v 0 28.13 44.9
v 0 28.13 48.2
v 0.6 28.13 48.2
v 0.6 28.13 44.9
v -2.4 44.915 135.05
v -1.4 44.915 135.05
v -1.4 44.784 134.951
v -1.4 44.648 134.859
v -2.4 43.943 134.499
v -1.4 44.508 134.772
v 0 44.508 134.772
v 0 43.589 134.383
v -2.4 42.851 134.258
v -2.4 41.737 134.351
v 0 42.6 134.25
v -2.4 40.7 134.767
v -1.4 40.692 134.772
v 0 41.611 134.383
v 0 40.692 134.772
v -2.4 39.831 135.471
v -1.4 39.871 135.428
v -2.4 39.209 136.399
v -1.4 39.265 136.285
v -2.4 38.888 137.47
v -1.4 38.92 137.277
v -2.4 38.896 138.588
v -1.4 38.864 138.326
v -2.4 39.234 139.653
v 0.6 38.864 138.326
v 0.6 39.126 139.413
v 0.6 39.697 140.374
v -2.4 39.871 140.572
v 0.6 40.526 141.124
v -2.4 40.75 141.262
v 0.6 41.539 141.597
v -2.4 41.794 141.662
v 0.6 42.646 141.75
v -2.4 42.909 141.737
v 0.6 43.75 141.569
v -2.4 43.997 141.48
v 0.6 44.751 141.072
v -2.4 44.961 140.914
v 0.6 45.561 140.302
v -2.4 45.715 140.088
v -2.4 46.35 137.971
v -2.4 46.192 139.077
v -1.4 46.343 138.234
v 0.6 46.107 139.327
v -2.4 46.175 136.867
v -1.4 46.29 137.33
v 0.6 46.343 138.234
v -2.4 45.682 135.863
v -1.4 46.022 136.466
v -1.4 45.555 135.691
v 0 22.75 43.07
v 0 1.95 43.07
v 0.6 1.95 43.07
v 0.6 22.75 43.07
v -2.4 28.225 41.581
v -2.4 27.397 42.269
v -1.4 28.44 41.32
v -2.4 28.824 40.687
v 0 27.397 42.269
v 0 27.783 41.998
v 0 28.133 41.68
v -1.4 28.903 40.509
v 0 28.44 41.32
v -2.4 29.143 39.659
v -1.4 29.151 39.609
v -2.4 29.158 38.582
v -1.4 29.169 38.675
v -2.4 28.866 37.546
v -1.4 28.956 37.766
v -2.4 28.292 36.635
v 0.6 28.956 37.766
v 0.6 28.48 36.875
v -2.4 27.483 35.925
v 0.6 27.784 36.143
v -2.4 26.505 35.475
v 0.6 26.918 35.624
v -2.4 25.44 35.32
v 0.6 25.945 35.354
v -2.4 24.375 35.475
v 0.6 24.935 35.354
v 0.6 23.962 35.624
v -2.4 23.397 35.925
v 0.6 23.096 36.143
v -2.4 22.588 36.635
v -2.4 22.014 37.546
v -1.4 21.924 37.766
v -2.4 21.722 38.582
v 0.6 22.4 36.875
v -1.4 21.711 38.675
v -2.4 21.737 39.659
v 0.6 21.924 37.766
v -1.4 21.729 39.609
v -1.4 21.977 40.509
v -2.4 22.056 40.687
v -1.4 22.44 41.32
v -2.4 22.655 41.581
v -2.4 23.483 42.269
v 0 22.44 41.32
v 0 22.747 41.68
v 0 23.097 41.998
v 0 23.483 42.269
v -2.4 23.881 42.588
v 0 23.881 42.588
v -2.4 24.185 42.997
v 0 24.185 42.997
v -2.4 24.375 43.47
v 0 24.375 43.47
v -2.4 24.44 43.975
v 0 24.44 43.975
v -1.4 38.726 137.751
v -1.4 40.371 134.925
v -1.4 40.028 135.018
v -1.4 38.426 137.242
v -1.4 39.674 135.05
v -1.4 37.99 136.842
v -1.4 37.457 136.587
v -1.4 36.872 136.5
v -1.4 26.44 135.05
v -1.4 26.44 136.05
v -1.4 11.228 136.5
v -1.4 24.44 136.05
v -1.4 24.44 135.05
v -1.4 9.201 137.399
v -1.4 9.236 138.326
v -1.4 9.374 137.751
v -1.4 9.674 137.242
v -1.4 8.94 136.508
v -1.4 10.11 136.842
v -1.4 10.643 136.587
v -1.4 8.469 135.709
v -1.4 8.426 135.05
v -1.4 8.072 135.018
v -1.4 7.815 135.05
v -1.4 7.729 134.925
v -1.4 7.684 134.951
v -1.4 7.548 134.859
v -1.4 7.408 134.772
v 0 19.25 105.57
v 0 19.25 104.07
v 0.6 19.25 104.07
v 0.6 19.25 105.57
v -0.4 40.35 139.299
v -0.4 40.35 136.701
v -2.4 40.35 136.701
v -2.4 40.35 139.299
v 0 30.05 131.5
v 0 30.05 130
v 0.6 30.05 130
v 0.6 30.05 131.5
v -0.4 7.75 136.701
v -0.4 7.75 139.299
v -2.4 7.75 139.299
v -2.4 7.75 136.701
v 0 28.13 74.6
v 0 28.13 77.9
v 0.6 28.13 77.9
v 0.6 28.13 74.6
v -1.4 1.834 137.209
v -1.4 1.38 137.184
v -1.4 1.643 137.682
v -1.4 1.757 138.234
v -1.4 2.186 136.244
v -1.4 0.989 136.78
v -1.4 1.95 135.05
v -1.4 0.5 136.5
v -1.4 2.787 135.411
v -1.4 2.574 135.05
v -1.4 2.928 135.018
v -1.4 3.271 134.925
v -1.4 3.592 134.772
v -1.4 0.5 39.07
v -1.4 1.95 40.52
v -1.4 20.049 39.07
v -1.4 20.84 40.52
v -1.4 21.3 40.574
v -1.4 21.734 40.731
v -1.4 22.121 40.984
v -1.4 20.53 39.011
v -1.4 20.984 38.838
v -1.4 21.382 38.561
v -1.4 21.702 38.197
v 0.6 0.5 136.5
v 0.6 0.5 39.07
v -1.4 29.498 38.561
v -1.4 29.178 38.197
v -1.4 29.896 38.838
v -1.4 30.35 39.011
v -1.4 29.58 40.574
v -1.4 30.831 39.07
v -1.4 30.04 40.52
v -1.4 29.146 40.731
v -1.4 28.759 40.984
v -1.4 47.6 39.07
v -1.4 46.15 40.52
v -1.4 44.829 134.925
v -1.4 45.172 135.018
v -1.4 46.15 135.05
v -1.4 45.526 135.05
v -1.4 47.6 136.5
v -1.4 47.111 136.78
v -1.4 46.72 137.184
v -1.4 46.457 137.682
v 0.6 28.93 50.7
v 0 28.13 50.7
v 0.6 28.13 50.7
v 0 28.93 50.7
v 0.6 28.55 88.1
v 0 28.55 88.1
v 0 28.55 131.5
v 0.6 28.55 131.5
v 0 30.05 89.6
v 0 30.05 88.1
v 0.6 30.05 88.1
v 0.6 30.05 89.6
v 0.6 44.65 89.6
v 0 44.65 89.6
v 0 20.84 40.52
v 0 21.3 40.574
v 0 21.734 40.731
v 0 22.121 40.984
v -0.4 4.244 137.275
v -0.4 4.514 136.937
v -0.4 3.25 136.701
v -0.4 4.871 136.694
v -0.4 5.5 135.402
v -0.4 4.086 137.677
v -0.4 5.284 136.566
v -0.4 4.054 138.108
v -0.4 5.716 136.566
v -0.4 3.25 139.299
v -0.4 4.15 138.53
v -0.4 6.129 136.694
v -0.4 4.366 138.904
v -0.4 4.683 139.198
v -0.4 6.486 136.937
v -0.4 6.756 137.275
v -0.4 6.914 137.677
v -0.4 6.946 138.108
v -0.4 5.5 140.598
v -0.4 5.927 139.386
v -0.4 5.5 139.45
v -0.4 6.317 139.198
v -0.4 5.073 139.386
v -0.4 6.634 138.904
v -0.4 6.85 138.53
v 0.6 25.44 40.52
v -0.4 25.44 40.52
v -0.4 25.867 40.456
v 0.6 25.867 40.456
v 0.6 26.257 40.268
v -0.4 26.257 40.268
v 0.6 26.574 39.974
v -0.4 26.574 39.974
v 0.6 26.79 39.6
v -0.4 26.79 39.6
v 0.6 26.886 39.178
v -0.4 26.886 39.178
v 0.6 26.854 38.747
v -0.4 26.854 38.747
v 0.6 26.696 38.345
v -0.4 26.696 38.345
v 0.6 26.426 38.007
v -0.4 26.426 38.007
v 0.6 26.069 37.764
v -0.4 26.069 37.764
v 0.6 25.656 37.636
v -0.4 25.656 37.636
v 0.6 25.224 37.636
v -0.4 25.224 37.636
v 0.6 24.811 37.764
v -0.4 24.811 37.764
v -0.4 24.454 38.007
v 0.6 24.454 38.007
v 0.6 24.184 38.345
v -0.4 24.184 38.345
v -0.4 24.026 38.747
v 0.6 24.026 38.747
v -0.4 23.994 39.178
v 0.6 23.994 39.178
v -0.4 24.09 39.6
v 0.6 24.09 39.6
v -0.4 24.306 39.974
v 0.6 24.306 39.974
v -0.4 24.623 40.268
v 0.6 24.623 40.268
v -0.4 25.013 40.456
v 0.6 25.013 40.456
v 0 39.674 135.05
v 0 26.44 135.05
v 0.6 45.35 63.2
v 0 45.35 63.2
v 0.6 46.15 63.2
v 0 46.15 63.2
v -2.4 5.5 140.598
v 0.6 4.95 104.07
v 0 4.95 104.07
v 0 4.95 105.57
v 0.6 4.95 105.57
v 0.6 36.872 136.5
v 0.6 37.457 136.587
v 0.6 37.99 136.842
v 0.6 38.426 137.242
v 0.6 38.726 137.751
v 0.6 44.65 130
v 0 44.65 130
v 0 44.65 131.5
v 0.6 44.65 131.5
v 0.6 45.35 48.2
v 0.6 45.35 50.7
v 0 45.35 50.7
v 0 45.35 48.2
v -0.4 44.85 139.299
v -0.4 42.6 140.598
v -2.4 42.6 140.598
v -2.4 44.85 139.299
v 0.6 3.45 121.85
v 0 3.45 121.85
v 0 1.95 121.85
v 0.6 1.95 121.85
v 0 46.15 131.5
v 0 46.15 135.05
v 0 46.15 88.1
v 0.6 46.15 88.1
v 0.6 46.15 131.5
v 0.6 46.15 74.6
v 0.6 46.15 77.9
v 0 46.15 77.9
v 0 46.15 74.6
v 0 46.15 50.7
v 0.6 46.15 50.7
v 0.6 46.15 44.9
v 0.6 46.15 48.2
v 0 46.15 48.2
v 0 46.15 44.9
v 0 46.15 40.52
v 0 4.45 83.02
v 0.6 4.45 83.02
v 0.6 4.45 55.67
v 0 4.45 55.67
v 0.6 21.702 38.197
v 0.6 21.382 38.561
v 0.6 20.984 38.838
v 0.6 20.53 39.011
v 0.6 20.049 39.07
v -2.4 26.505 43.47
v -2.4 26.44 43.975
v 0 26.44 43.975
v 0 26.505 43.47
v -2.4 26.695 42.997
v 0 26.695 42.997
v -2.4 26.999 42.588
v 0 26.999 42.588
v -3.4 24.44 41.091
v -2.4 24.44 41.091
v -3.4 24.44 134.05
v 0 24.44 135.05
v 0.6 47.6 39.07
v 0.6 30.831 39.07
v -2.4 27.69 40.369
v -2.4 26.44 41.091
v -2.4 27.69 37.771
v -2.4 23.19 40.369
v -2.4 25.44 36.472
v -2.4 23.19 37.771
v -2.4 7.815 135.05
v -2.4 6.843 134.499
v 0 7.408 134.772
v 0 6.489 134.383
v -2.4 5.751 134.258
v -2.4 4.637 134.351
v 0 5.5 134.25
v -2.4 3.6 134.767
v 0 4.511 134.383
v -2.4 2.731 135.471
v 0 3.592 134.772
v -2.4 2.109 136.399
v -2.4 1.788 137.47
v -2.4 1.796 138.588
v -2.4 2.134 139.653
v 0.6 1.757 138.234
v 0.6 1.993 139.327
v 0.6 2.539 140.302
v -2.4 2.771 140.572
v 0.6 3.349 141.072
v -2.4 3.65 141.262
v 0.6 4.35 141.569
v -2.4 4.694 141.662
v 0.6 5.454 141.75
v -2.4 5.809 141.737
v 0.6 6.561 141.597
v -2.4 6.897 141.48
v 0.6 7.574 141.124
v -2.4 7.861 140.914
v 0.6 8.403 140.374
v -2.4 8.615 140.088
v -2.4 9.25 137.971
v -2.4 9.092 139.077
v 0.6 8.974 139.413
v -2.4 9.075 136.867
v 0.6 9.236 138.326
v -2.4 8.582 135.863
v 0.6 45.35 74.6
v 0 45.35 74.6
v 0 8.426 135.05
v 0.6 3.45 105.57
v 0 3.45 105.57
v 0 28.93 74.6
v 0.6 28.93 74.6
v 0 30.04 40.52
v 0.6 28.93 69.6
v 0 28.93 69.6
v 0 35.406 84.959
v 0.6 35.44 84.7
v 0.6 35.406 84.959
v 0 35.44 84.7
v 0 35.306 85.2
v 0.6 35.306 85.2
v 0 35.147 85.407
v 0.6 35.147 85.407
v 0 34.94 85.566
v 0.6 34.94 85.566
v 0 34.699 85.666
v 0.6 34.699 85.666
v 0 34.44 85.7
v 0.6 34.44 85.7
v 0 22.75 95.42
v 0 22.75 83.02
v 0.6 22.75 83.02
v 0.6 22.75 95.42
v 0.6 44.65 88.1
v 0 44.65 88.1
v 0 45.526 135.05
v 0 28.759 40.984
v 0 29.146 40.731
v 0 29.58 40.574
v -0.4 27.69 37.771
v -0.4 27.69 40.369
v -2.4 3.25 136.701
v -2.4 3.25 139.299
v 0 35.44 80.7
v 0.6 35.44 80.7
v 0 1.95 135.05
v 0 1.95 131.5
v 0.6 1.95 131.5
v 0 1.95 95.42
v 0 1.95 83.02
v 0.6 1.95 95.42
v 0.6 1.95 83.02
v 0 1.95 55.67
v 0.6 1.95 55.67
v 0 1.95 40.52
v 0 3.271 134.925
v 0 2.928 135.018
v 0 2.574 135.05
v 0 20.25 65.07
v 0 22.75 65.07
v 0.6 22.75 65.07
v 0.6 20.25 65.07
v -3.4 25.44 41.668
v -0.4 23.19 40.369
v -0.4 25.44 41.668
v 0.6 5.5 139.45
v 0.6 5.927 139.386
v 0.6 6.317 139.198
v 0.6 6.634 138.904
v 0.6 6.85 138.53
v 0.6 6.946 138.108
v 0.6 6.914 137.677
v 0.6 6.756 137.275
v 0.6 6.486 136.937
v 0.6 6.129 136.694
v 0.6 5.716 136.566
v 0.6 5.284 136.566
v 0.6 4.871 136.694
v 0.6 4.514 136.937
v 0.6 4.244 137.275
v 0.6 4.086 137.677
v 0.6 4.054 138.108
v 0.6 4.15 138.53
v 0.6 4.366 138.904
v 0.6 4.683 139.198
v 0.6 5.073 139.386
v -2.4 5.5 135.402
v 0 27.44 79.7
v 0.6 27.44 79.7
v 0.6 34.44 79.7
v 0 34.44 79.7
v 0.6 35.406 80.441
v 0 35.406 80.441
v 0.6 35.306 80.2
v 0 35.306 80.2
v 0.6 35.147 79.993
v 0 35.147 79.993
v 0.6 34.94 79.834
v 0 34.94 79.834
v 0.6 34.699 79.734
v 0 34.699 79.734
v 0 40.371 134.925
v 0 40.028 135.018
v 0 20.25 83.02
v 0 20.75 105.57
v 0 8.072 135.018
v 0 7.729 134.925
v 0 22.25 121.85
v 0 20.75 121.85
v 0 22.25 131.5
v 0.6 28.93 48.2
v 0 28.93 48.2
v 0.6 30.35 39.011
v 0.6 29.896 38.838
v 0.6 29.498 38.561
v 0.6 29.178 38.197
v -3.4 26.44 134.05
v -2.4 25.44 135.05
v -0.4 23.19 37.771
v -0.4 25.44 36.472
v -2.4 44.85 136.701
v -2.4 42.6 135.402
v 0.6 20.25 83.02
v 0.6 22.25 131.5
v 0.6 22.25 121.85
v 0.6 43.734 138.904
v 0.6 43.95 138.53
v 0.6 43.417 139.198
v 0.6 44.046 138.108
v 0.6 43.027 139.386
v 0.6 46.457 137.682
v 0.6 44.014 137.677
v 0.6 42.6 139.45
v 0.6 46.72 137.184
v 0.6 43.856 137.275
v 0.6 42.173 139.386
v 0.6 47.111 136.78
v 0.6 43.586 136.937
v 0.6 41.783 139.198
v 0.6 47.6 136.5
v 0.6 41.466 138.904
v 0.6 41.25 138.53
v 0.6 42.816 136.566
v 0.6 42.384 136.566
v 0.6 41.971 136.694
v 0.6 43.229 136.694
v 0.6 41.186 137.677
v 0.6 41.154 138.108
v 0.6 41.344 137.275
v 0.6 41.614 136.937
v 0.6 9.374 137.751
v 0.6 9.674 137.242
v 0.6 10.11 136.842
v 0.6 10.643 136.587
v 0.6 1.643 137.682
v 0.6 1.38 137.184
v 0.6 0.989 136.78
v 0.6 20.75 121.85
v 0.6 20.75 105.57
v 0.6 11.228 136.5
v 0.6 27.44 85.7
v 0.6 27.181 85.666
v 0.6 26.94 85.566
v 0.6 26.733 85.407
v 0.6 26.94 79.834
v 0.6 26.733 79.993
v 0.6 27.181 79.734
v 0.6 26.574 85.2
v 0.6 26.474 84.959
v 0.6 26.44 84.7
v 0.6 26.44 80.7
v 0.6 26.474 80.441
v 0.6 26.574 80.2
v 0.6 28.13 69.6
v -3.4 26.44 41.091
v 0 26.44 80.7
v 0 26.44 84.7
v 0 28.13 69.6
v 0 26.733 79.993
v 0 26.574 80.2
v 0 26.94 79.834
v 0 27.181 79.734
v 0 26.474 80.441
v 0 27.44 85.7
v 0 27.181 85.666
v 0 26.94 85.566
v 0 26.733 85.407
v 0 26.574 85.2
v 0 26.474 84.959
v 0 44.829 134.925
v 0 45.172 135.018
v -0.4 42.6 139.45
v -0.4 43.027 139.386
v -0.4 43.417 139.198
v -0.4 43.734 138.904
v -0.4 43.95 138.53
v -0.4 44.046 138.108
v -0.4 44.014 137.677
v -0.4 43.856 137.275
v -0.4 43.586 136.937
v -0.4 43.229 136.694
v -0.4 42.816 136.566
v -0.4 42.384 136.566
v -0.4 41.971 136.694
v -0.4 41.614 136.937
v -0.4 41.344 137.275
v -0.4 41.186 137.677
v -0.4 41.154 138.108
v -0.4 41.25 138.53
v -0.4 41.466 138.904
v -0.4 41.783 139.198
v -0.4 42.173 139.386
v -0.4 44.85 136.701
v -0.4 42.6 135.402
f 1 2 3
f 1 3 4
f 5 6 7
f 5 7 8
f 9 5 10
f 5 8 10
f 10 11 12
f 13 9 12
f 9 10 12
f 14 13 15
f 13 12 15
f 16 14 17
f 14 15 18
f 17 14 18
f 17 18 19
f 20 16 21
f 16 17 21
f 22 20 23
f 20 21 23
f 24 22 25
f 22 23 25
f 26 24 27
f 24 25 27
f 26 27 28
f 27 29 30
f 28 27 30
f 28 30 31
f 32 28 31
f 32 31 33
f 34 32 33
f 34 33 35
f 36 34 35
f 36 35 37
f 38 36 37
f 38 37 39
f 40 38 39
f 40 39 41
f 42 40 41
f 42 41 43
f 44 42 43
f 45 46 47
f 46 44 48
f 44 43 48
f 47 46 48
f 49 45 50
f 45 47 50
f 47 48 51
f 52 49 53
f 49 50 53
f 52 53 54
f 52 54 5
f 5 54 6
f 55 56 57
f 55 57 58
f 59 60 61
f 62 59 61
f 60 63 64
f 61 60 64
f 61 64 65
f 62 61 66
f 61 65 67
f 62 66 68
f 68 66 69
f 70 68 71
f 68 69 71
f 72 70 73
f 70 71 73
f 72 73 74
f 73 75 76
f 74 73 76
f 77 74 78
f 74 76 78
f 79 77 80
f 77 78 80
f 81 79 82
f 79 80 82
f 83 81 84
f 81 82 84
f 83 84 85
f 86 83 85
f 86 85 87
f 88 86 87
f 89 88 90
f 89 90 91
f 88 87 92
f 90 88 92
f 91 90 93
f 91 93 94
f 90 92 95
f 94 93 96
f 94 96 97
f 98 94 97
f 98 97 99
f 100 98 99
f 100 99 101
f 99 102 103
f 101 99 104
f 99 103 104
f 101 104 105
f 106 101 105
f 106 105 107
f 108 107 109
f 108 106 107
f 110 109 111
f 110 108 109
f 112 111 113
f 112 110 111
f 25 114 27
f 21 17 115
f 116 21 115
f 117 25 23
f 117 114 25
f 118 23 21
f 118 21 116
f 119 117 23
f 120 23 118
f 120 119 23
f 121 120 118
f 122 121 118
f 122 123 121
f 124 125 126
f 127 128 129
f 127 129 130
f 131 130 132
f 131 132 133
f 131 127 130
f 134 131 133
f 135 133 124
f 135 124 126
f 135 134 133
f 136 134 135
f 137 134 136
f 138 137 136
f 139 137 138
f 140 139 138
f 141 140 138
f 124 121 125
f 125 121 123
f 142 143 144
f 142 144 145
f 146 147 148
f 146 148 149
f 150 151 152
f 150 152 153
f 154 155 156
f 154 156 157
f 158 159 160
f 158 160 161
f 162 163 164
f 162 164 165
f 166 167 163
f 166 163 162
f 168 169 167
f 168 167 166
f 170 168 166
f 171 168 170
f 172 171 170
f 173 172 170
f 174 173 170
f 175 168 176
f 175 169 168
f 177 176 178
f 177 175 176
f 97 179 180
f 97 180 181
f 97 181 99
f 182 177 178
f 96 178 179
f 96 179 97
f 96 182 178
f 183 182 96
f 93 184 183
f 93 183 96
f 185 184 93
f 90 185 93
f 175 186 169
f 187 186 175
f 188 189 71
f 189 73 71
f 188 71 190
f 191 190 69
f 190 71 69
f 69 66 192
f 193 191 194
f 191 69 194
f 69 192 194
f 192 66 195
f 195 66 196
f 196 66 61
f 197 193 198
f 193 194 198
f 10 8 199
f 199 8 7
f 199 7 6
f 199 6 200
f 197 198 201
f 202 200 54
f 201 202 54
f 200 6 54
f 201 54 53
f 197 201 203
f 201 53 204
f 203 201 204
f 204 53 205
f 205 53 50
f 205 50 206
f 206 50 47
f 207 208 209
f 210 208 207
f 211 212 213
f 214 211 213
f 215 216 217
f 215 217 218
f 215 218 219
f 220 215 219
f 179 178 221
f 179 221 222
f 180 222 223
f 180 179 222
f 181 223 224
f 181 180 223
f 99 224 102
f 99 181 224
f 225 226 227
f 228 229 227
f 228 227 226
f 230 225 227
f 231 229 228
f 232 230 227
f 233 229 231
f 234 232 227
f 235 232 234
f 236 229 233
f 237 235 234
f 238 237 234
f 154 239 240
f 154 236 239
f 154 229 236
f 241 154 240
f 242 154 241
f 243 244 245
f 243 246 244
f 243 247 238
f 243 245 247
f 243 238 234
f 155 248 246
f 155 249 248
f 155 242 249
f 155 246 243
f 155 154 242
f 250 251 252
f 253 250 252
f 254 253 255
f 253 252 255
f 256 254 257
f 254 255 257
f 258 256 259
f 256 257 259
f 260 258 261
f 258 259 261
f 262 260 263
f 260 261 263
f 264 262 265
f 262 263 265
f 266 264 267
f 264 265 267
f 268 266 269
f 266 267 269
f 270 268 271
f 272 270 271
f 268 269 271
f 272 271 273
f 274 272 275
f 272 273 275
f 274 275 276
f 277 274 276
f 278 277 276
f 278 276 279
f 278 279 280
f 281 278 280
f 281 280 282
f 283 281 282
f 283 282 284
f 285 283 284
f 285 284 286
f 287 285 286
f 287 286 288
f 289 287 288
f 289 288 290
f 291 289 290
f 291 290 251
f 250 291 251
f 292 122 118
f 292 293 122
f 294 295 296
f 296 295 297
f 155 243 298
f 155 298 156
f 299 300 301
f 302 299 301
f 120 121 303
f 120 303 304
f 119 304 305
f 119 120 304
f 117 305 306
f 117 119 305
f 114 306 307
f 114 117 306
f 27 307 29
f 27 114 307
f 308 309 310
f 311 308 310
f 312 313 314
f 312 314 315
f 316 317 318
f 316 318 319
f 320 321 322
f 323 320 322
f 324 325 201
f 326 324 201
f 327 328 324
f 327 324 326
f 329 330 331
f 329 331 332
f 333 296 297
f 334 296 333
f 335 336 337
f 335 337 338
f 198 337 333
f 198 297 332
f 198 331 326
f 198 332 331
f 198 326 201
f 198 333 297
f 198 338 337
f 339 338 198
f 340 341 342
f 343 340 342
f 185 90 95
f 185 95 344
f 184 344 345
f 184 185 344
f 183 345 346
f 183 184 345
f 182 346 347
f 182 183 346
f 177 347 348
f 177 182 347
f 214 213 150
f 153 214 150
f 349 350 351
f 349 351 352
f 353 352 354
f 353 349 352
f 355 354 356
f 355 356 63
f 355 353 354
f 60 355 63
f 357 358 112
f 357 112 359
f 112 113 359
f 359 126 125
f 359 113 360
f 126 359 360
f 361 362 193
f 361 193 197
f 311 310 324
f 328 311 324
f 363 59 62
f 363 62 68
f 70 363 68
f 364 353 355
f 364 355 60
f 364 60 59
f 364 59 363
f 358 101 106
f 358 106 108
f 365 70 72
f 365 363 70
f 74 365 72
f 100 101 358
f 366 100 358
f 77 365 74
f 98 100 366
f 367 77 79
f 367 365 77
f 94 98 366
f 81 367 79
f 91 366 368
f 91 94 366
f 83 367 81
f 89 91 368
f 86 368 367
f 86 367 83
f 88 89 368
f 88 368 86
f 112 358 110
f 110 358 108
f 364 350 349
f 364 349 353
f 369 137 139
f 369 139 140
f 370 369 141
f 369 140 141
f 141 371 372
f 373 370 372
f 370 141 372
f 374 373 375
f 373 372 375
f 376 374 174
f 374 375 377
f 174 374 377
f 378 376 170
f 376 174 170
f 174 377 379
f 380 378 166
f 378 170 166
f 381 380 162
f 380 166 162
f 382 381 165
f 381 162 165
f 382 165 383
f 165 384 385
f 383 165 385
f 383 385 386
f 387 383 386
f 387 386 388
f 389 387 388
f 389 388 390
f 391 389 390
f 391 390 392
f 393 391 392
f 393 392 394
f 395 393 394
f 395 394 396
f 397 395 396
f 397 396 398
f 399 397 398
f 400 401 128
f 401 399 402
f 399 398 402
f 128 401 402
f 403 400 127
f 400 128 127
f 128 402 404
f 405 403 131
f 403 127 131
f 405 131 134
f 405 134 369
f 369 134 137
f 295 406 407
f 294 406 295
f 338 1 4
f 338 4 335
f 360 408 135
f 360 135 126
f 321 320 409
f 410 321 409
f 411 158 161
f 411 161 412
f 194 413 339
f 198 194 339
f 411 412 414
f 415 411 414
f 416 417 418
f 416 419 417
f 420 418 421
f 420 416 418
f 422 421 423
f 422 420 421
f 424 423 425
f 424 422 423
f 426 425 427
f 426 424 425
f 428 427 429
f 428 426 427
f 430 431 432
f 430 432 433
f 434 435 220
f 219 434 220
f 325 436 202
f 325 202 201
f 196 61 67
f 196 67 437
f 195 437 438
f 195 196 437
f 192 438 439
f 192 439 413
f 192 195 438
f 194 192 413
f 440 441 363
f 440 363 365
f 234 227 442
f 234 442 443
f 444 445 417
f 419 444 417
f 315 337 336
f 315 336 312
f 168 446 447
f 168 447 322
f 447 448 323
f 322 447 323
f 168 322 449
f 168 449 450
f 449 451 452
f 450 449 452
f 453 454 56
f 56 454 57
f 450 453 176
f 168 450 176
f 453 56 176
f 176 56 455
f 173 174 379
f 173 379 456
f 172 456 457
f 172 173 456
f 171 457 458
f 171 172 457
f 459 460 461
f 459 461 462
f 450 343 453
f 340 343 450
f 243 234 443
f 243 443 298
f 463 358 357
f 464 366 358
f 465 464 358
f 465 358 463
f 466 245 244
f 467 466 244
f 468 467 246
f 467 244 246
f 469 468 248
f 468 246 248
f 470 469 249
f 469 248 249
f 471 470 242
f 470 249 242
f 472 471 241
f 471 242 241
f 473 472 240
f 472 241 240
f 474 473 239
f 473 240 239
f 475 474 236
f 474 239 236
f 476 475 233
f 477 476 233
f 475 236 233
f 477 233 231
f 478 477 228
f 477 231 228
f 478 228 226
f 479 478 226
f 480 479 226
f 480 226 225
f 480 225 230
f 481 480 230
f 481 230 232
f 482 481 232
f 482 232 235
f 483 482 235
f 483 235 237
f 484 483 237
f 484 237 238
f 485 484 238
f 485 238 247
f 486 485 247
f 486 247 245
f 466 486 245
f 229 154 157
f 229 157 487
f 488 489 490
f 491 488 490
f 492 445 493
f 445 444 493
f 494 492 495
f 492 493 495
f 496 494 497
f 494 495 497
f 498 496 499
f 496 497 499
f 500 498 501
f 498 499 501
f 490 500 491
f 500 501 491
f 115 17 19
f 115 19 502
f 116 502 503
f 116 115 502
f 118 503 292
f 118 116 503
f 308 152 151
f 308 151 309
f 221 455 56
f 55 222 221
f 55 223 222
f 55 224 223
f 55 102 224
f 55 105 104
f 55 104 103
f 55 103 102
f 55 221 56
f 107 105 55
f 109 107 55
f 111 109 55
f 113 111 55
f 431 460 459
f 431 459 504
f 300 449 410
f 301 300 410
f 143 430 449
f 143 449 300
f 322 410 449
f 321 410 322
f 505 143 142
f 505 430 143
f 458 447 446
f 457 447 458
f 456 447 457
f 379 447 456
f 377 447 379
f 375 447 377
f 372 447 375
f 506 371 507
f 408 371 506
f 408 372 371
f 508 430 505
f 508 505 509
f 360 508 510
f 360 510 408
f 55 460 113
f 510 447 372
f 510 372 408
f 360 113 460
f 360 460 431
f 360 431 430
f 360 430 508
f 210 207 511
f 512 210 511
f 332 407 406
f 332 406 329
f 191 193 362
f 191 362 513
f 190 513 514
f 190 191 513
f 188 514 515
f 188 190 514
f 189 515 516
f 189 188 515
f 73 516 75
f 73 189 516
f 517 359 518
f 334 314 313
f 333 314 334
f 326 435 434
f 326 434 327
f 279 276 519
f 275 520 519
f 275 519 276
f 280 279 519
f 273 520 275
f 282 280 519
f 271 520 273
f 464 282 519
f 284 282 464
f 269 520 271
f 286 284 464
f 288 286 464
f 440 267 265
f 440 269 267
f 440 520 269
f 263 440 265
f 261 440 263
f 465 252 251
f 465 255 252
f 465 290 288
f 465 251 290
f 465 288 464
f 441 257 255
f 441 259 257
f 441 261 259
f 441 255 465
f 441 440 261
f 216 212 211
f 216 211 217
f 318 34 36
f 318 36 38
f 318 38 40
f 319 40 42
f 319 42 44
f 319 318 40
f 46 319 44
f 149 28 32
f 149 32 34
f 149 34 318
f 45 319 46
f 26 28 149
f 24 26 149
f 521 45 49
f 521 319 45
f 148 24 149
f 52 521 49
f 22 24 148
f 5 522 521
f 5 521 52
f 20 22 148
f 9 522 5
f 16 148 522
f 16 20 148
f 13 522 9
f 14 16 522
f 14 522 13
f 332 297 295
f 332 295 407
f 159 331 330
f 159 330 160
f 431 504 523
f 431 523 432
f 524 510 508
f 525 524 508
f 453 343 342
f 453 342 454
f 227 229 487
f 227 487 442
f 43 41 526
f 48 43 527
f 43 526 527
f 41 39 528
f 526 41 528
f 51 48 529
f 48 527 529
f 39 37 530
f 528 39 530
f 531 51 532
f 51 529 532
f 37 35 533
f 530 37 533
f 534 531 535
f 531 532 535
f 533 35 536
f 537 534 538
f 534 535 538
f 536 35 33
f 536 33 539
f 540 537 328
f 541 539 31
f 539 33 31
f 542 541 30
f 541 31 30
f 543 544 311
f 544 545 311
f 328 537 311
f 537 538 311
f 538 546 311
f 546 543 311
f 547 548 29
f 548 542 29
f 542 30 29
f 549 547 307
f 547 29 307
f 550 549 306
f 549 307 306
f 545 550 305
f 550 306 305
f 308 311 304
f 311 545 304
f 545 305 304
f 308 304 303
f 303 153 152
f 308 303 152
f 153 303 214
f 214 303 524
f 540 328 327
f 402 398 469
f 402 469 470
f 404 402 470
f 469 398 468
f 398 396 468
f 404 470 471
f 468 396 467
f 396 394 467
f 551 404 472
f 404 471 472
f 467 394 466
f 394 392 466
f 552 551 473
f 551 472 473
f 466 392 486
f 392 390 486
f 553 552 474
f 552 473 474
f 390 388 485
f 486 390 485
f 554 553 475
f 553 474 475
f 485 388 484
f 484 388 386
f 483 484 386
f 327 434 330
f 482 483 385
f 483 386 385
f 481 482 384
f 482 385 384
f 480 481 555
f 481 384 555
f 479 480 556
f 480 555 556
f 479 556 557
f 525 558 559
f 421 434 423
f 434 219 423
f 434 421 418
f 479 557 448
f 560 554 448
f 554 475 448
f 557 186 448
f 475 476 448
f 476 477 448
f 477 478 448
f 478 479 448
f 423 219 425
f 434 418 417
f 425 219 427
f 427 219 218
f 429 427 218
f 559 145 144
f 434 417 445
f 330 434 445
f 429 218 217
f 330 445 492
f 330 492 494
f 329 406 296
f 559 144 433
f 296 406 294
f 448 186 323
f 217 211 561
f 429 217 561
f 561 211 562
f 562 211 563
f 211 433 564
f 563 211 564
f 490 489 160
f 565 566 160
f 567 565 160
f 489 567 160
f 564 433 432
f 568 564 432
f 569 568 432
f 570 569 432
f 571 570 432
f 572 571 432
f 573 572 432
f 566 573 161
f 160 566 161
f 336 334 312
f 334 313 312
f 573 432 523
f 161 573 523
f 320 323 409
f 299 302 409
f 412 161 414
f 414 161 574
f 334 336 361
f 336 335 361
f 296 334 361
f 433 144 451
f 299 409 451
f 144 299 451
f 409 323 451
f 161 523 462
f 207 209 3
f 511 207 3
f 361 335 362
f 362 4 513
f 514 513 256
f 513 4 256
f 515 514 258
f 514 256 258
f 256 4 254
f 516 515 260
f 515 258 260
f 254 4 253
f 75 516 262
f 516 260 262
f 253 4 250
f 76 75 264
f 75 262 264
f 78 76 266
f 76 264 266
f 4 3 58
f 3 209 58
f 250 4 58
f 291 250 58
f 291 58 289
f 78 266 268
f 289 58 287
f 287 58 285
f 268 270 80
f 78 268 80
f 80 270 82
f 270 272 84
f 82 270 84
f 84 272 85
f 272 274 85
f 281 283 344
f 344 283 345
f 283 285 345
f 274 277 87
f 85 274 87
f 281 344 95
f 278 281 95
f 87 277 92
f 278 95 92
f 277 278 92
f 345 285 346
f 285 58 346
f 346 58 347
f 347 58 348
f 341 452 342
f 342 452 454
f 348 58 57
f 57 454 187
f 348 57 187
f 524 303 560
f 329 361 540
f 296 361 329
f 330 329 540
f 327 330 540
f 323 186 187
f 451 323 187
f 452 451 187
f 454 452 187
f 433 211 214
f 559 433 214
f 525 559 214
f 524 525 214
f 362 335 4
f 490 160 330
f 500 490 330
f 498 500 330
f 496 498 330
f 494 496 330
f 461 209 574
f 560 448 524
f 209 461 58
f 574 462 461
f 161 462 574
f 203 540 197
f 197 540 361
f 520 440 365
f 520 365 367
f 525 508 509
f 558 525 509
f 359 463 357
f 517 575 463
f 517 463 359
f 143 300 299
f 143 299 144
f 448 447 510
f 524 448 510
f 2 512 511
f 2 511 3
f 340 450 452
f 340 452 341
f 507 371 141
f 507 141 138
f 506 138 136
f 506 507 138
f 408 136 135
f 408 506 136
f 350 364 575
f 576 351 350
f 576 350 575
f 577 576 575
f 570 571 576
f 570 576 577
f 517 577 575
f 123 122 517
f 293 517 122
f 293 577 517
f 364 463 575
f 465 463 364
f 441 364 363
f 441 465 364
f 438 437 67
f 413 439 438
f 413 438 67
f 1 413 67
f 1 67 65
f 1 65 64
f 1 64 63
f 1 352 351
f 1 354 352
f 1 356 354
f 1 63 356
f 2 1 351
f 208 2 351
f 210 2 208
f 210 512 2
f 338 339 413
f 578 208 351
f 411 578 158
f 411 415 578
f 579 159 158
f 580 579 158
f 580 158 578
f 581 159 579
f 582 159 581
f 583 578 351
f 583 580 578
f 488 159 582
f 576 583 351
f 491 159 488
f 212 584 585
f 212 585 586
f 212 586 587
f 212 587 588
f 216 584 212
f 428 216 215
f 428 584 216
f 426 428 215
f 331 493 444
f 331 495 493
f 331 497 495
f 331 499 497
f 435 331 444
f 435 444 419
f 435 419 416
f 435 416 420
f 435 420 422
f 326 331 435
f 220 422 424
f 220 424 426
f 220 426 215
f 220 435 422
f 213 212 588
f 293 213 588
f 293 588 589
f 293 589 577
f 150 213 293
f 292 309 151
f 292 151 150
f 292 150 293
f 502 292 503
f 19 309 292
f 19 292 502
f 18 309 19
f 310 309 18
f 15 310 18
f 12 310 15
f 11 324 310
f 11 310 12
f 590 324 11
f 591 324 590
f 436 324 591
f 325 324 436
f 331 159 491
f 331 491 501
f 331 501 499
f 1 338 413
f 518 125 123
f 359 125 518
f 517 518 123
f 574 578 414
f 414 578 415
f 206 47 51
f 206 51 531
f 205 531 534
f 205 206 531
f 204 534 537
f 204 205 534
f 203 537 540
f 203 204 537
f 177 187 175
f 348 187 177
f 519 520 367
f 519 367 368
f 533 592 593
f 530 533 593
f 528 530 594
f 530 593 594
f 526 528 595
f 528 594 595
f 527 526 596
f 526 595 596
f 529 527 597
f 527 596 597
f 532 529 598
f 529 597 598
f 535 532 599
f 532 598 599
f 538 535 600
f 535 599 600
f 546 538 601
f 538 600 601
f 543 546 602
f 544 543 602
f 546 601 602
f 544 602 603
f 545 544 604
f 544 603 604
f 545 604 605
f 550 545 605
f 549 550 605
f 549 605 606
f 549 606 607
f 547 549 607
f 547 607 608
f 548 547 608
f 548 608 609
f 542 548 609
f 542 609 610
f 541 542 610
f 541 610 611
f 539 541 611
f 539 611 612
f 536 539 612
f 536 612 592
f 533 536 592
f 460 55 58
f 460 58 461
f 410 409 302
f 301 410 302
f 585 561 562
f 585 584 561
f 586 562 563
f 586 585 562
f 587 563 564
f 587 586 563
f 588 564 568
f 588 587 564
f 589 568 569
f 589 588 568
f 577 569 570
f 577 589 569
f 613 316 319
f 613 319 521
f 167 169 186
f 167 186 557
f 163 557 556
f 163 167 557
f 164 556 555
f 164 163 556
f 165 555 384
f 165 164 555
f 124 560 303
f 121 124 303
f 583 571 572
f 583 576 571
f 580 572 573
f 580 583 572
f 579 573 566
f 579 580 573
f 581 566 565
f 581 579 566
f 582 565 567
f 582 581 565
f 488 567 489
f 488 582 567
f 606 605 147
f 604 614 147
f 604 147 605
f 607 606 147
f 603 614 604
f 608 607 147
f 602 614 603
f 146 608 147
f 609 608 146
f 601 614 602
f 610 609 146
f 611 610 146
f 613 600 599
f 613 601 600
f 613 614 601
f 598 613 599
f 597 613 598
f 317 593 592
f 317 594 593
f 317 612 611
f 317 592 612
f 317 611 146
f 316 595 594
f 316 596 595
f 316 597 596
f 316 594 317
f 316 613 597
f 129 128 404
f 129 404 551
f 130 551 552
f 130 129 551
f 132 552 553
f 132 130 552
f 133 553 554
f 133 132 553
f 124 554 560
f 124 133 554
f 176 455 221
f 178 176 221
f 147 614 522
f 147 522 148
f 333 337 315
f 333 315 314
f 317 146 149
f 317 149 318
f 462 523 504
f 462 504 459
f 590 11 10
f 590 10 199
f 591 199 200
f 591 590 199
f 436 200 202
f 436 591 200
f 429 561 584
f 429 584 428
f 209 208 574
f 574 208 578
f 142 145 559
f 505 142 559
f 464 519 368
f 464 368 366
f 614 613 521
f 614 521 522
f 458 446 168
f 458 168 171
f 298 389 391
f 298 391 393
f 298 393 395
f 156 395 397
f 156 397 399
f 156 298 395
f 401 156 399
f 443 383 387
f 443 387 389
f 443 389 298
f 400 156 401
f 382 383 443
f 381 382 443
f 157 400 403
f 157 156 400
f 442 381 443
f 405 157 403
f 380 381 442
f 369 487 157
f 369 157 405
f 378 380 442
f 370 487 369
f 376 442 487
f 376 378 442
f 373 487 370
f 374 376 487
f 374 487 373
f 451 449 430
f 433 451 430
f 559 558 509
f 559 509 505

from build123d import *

# Parameters (mm, degrees)
BOSS_EXTRUDE1_DEPTH             = 0.6
SKETCH3_W                       = 40.4
SKETCH3_H                       = 14.6
SKETCH3_W_2                     = 31.4
SKETCH3_H_2                     = 16.42
SKETCH3_W_3                     = 40.3
SKETCH3_H_3                     = 15.8
SKETCH3_W_4                     = 24.43
SKETCH3_H_4                     = 17.3
CUT_EXTRUDE1_DEPTH              = 145.562685365
SKETCH4_W                       = 12.4
SKETCH4_H                       = 20.8
SKETCH4_W_2                     = 12.5
SKETCH4_H_2                     = 0.8
SKETCH4_W_3                     = 18.9
SKETCH4_W_4                     = 43.4
SKETCH4_H_3                     = 1.5
SKETCH4_W_5                     = 1.5
SKETCH4_H_4                     = 14.3
CUT_EXTRUDE2_DEPTH              = 145.562685365
SKETCH5_W                       = 97.43
SKETCH5_H                       = 47.1
SKETCH5_W_2                     = 94.53
SKETCH5_H_2                     = 44.2
BOSS_EXTRUDE2_DEPTH             = 2
BOSS_EXTRUDE3_REACH             = 146.575
SKETCH6_W                       = 94.53
SKETCH6_H                       = 2
BOSS_EXTRUDE3_DIRECTION_2_DEPTH = 2
SKETCH7_R                       = 3.75
BOSS_EXTRUDE4_DEPTH             = 3
CUT_EXTRUDE3_DEPTH              = 150.558759356
CUT_EXTRUDE3_DEPTH_BACK         = 2
SKETCH9_R                       = 1.45
CUT_EXTRUDE4_DEPTH              = 150.558759356
CHAMFER1_SIZE                   = 1
FILLET1_R                       = 2
CUT_EXTRUDE5_DEPTH              = 150.542042583
CUT_EXTRUDE5_DEPTH_BACK         = 150.542042583
SKETCH10_W                      = 6
SKETCH10_H                      = 9
FILLET2_R                       = 1


# Some blends are built 0.0001 mm under size
with BuildPart() as part:
    # Sketch1 → Boss-Extrude1 (new body)
    with BuildSketch(Plane(origin=(0, 0, 0), x_dir=(0, 0, -1), z_dir=(1, 0, 0))):
        Polygon((-39.07, 0.5), (-136.5, 0.5), (-136.5, 47.6), (-39.07, 47.6), (-39.07, 28.13), align=None)
    extrude(amount=BOSS_EXTRUDE1_DEPTH)

    # Sketch3 → Cut-Extrude1 (cut, through all)
    with BuildSketch(Plane(origin=(0.6, 0, 0), x_dir=(0, 0, -1), z_dir=(1, 0, 0))):
        with Locations((-109.8, 37.35)):
            Rectangle(SKETCH3_W, SKETCH3_H)
        with Locations((-61.4, 37.14)):
            Rectangle(SKETCH3_W_2, SKETCH3_H_2)
        with Locations((-67.72, 12.35)):
            Rectangle(SKETCH3_W_3, SKETCH3_H_3)
        with Locations((-117.785, 12.1)):
            Rectangle(SKETCH3_W_4, SKETCH3_H_4)
    extrude(amount=-CUT_EXTRUDE1_DEPTH, mode=Mode.SUBTRACT)

    # Sketch4 → Cut-Extrude2 (cut, through all)
    with BuildSketch(Plane.ZY):
        with Locations((89.22, 12.35)):
            Rectangle(SKETCH4_W, SKETCH4_H)
        Polygon((65.07, 22.75), (65.07, 20.25), (55.67, 20.25), (55.67, 1.95), (43.07, 1.95), (43.07, 22.75), align=None)
        Polygon((44.9, 28.13), (44.9, 46.15), (48.2, 46.15), (48.2, 45.35), (45.7, 45.35), (45.7, 28.93), (48.2, 28.93), (48.2, 28.13), align=None)
        Polygon((77.9, 28.13), (74.6, 28.13), (74.6, 28.93), (77.1, 28.93), (77.1, 45.35), (74.6, 45.35), (74.6, 46.15), (77.9, 46.15), align=None)
        with Locations((56.95, 45.75)):
            Rectangle(SKETCH4_W_2, SKETCH4_H_2)
        with Locations((60.15, 28.53)):
            Rectangle(SKETCH4_W_3, SKETCH4_H_2)
        with Locations((109.8, 45.4)):
            Rectangle(SKETCH4_W_4, SKETCH4_H_3)
        with Locations((109.8, 29.3)):
            Rectangle(SKETCH4_W_4, SKETCH4_H_3)
        Polygon((131.5, 1.95), (131.5, 22.25), (121.85, 22.25), (121.85, 20.75), (130, 20.75), (130, 3.45), (121.85, 3.45), (121.85, 1.95), align=None)
        with Locations((104.82, 12.1)):
            Rectangle(SKETCH4_W_5, SKETCH4_H_4)
    extrude(amount=-CUT_EXTRUDE2_DEPTH, mode=Mode.SUBTRACT)

    # Sketch5 → Boss-Extrude2 (add)
    with BuildSketch(Plane(origin=(0.6, 0, 0), x_dir=(0, 0, -1), z_dir=(1, 0, 0))):
        with Locations((-87.785, 24.05)):
            Rectangle(SKETCH5_W, SKETCH5_H)
        with Locations((-87.785, 24.05)):
            Rectangle(SKETCH5_W_2, SKETCH5_H_2, mode=Mode.SUBTRACT)
    extrude(amount=-BOSS_EXTRUDE2_DEPTH)

    # Sketch6 → Boss-Extrude3 (add, up to next)
    with BuildSketch(Plane.ZY.offset(1.4), mode=Mode.PRIVATE) as boss_extrude3_sk1:
        with Locations((87.785, 25.44)):
            Rectangle(SKETCH6_W, SKETCH6_H)
    boss_extrude3_tool1 = extrude(boss_extrude3_sk1.sketch, amount=-BOSS_EXTRUDE3_REACH, mode=Mode.PRIVATE) - part.part
    add(boss_extrude3_tool1.solids().sort_by_distance((-1.4, 25.44, 87.785))[0])

    # Sketch6 → Boss-Extrude3 direction 2 (add)
    with BuildSketch(Plane.ZY.offset(1.4)):
        with Locations((87.785, 25.44)):
            Rectangle(SKETCH6_W, SKETCH6_H)
    extrude(amount=BOSS_EXTRUDE3_DIRECTION_2_DEPTH)

    # Sketch7 → Boss-Extrude4 (add)
    with BuildSketch(Plane.ZY.offset(-0.6)):
        with Locations((39.07, 25.44)):
            Circle(SKETCH7_R)
        with Locations(Location((138, 42.6, 0), (0, 0, 141.875088378))):
            Circle(SKETCH7_R)
        with Locations(Location((138, 5.5, 0), (0, 0, 141.875088378))):
            Circle(SKETCH7_R)
    extrude(amount=BOSS_EXTRUDE4_DEPTH)

    # Sketch8 → Cut-Extrude3 (cut, two sides: drawn at the far end of the back side and taken through both)
    with BuildSketch(Plane.ZY.offset(2.4).offset(-CUT_EXTRUDE3_DEPTH_BACK)):
        Polygon((36.471923789, 25.44), (37.770961894, 23.19), (40.369038106, 23.19), (41.668076211, 25.44), (40.369038106, 27.69), (37.770961894, 27.69), align=None)
        Polygon((139.299038106, 44.85), (136.700961894, 44.85), (135.401923789, 42.6), (136.700961894, 40.35), (139.299038106, 40.35), (140.598076211, 42.6), align=None)
        Polygon((139.299038106, 7.75), (136.700961894, 7.75), (135.401923789, 5.5), (136.700961894, 3.25), (139.299038106, 3.25), (140.598076211, 5.5), align=None)
    extrude(amount=CUT_EXTRUDE3_DEPTH + CUT_EXTRUDE3_DEPTH_BACK, mode=Mode.SUBTRACT)

    # Sketch9 → Cut-Extrude4 (cut, through all)
    with BuildSketch(Plane.ZY.offset(0.4)):
        with Locations((138, 5.5)):
            Circle(SKETCH9_R)
        with Locations((138, 42.6)):
            Circle(SKETCH9_R)
        with Locations((39.07, 25.44)):
            Circle(SKETCH9_R)
    extrude(amount=-CUT_EXTRUDE4_DEPTH, mode=Mode.SUBTRACT)

    # Chamfer1
    chamfer1_edges = [part.edges().sort_by_distance(p)[0] for p in [
        (-1.4, 25.44, 135.05),
    ]]
    chamfer(chamfer1_edges, length=CHAMFER1_SIZE)
    chamfer1_2_edges = [part.edges().sort_by_distance(p)[0] for p in [
        (-2.9, 24.44, 135.05),
        (-2.9, 26.44, 135.05),
        (-3.4, 25.44, 135.05),
    ]]
    chamfer(chamfer1_2_edges, length=CHAMFER1_SIZE - 0.0001)  # a hair under: the kernel refuses the full size

    # Fillet1
    # the kernel refuses this fillet: 2 mm, written as the material it adds along each edge
    with BuildSketch(Plane(origin=(-2.4, 26.44, 42.684208074), x_dir=(0, 0, 1), z_dir=(1, 0, 0))) as fillet1_piece_1:
        with BuildLine():
            CenterArc((1.291146144, -2), FILLET1_R, 90, 58.551018611)
            Line((-0.415064019, -0.956521739), (-0.449188222, -0.935652174))
            ThreePointArc((-0.449188222, -0.935652174), (-0.210818686, -0.47683468), (-0.038551553, 0.010666667))
            Line((-0.038551553, 0.010666667), (0, 0.04))
            Line((0, 0.04), (1.291146144, 0.04))
            Line((1.291146144, 0.04), (1.291146144, 0))
        make_face()
    extrude(amount=2.4)
    with BuildSketch(Plane(origin=(-1.4, 21.69, 39.07), x_dir=(0, -1, 0), z_dir=(1, 0, 0))) as fillet1_piece_2:
        with BuildLine():
            CenterArc((1.640964663, 2), FILLET1_R, 200.354406398, 69.645593602)
            Line((-0.234153481, 1.304347826), (-0.271655843, 1.290434783))
            ThreePointArc((-0.271655843, 1.290434783), (-0.098373183, 0.655531532), (-0.04, 0))
            Line((-0.04, 0), (0, -0.04))
            Line((0, -0.04), (1.640964663, -0.04))
            Line((1.640964663, -0.04), (1.640964663, 0))
        make_face()
    extrude(amount=2)
    with BuildSketch(Plane(origin=(-1.4, 21.981676707, 40.52), x_dir=(0, -1, 0), z_dir=(1, 0, 0))) as fillet1_piece_3:
        with BuildLine():
            CenterArc((1.141676707, -2), FILLET1_R, 90, 53.130102354)
            Line((-0.458323293, -0.8), (-0.490323293, -0.776))
            ThreePointArc((-0.490323293, -0.776), (-0.23918937, -0.394255076), (-0.036888782, 0.015466667))
            Line((-0.036888782, 0.015466667), (0, 0.04))
            Line((0, 0.04), (1.141676707, 0.04))
            Line((1.141676707, 0.04), (1.141676707, 0))
        make_face()
    extrude(amount=1.4)
    with BuildSketch(Plane(origin=(-2.4, 24.44, 42.684208074), x_dir=(0, 0, 1), z_dir=(1, 0, 0))) as fillet1_piece_4:
        with BuildLine():
            CenterArc((1.291146144, 2), FILLET1_R, 211.448981389, 58.551018611)
            Line((-0.415064019, 0.956521739), (-0.449188222, 0.935652174))
            ThreePointArc((-0.449188222, 0.935652174), (-0.210818686, 0.47683468), (-0.038551553, -0.010666667))
            Line((-0.038551553, -0.010666667), (0, -0.04))
            Line((0, -0.04), (1.291146144, -0.04))
            Line((1.291146144, -0.04), (1.291146144, 0))
        make_face()
    extrude(amount=2.4)
    with BuildSketch(Plane(origin=(-1.4, 28.898323293, 40.52), x_dir=(0, 1, 0), z_dir=(1, 0, 0))) as fillet1_piece_5:
        with BuildLine():
            CenterArc((1.141676707, 2), FILLET1_R, 216.869897646, 53.130102354)
            Line((-0.458323293, 0.8), (-0.490323293, 0.776))
            ThreePointArc((-0.490323293, 0.776), (-0.23918937, 0.394255076), (-0.036888782, -0.015466667))
            Line((-0.036888782, -0.015466667), (0, -0.04))
            Line((0, -0.04), (1.141676707, -0.04))
            Line((1.141676707, -0.04), (1.141676707, 0))
        make_face()
    extrude(amount=1.4)
    with BuildSketch(Plane(origin=(-1.4, 29.19, 39.07), x_dir=(0, 1, 0), z_dir=(1, 0, 0))) as fillet1_piece_6:
        with BuildLine():
            CenterArc((1.640964663, -2), FILLET1_R, 90, 69.645593602)
            Line((-0.234153481, -1.304347826), (-0.271655843, -1.290434783))
            ThreePointArc((-0.271655843, -1.290434783), (-0.098373183, -0.655531532), (-0.04, 0))
            Line((-0.04, 0), (0, 0.04))
            Line((0, 0.04), (1.640964663, 0.04))
            Line((1.640964663, 0.04), (1.640964663, 0))
        make_face()
    extrude(amount=2)
    with BuildSketch(Plane(origin=(-1.4, 39.163068229, 136.5), x_dir=(0, -0.1615145706174524, 0.9868703275903374), z_dir=(1, 0, 0))) as fillet1_piece_7:
        with BuildLine():
            CenterArc((2.343817028, 1.938174847), FILLET1_R, 170.705181749, 85.011458024)
            Line((0.370076373, 2.261203989), (0.33060156, 2.267664571))
            Line((0.33060156, 2.267664571), (-0.039474813, 0.006460583))
            Line((-0.039474813, 0.006460583), (0.009868703, -0.038763497))
            ThreePointArc((0.009868703, -0.038763497), (0.925190932, 0.075922161), (1.840513161, -0.038763497))
            Line((1.840513161, -0.038763497), (1.850381864, 0))
        make_face()
    extrude(amount=2)
    with BuildSketch(Plane(origin=(-1.4, 46.036931771, 136.5), x_dir=(0, 0.1736759126148829, 0.9848028621898839), z_dir=(1, 0, 0))) as fillet1_piece_8:
        with BuildLine():
            CenterArc((2.230073146, -1.944114194), FILLET1_R, 103.576564864, 64.746091666)
            Line((0.271467301, -1.539314066), (0.232295184, -1.531218063))
            ThreePointArc((0.232295184, -1.531218063), (0.096341536, -0.776604069), (-0.039392114, -0.006947037))
            Line((-0.039392114, -0.006947037), (0.009389782, 0.038882284))
            ThreePointArc((0.009389782, 0.038882284), (0.880292031, -0.064785886), (1.751194281, 0.038882284))
            Line((1.751194281, 0.038882284), (1.760584063, 0))
        make_face()
    extrude(amount=2)
    with BuildSketch(Plane(origin=(0, 44.915167381, 135.05), x_dir=(0, -0.8255542427014289, -0.5643227732049012), z_dir=(-1, 0, 0)), Plane(origin=(-1.4, 40.284832619, 135.05), x_dir=(0, 0.8255542427012595, -0.5643227732051488), z_dir=(1, 0, 0)), Plane(origin=(0, 7.815167381, 135.05), x_dir=(0, -0.825554242701426, -0.5643227732049054), z_dir=(-1, 0, 0))) as fillet1_piece_9:
        with BuildLine():
            CenterArc((0.624578317, -1.995672903), FILLET1_R, 93.769634942, 30.585641738)
            Line((-0.504067229, -0.344564417), (-0.52664014, -0.311542248))
            Line((-0.52664014, -0.311542248), (-0.022572911, 0.03302217))
            Line((-0.022572911, 0.03302217), (0.002629803, 0.039913458))
            ThreePointArc((0.002629803, 0.039913458), (0.246544073, 0.031886693), (0.490458342, 0.039913458))
            Line((0.490458342, 0.039913458), (0.493088145, 0))
        make_face()
    extrude(amount=1.4)
    with BuildSketch(Plane(origin=(-1.4, 2.063068229, 136.5), x_dir=(0, -0.17367591261488685, 0.9848028621898832), z_dir=(1, 0, 0))) as fillet1_piece_10:
        with BuildLine():
            CenterArc((2.230073146, 1.944114194), FILLET1_R, 191.67734347, 64.746091666)
            Line((0.271467301, 1.539314066), (0.232295184, 1.531218063))
            ThreePointArc((0.232295184, 1.531218063), (0.096341536, 0.776604069), (-0.039392114, 0.006947037))
            Line((-0.039392114, 0.006947037), (0.009389782, -0.038882284))
            ThreePointArc((0.009389782, -0.038882284), (0.880292031, 0.064785886), (1.751194281, -0.038882284))
            Line((1.751194281, -0.038882284), (1.760584063, 0))
        make_face()
    extrude(amount=2)
    with BuildSketch(Plane(origin=(-1.4, 8.936931771, 136.5), x_dir=(0, 0.16151457061745614, 0.9868703275903369), z_dir=(1, 0, 0))) as fillet1_piece_11:
        with BuildLine():
            CenterArc((2.343817028, -1.938174847), FILLET1_R, 104.283360227, 85.011458024)
            Line((0.370076373, -2.261203989), (0.33060156, -2.267664571))
            Line((0.33060156, -2.267664571), (-0.039474813, -0.006460583))
            Line((-0.039474813, -0.006460583), (0.009868703, 0.038763497))
            ThreePointArc((0.009868703, 0.038763497), (0.925190932, -0.075922161), (1.840513161, 0.038763497))
            Line((1.840513161, 0.038763497), (1.850381864, 0))
        make_face()
    extrude(amount=2)
    with BuildSketch(Plane(origin=(-1.4, 3.184832619, 135.05), x_dir=(0, -1, 0), z_dir=(1, 0, 0))) as fillet1_piece_12:
        with BuildLine():
            CenterArc((0.610580387, 2), FILLET1_R, 239.414358262, 30.585641738)
            Line((-0.40707101, 0.27826087), (-0.427424038, 0.243826087))
            ThreePointArc((-0.427424038, 0.243826087), (-0.221529892, 0.11280624), (-0.024695119, -0.031466667))
            Line((-0.024695119, -0.031466667), (0, -0.04))
            Line((0, -0.04), (0.610580387, -0.04))
            Line((0.610580387, -0.04), (0.610580387, 0))
        make_face()
    extrude(amount=1.4)

    # Sketch10 → Cut-Extrude5 (cut, two sides: drawn at the far end of the back side and taken through both)
    with BuildSketch(Plane.ZY.offset(1.4).offset(-CUT_EXTRUDE5_DEPTH_BACK)):
        with Locations((82.7, 30.94)):
            Rectangle(SKETCH10_W, SKETCH10_H)
    extrude(amount=CUT_EXTRUDE5_DEPTH + CUT_EXTRUDE5_DEPTH_BACK, mode=Mode.SUBTRACT)

    # Fillet2
    fillet2_edges = [part.edges().sort_by_distance(p)[0] for p in [
        (0.3, 26.44, 79.7),
        (0.3, 35.44, 79.7),
        (0.3, 35.44, 85.7),
        (0.3, 26.44, 85.7),
    ]]
    fillet(fillet2_edges, radius=FILLET2_R)


solid = part.part
